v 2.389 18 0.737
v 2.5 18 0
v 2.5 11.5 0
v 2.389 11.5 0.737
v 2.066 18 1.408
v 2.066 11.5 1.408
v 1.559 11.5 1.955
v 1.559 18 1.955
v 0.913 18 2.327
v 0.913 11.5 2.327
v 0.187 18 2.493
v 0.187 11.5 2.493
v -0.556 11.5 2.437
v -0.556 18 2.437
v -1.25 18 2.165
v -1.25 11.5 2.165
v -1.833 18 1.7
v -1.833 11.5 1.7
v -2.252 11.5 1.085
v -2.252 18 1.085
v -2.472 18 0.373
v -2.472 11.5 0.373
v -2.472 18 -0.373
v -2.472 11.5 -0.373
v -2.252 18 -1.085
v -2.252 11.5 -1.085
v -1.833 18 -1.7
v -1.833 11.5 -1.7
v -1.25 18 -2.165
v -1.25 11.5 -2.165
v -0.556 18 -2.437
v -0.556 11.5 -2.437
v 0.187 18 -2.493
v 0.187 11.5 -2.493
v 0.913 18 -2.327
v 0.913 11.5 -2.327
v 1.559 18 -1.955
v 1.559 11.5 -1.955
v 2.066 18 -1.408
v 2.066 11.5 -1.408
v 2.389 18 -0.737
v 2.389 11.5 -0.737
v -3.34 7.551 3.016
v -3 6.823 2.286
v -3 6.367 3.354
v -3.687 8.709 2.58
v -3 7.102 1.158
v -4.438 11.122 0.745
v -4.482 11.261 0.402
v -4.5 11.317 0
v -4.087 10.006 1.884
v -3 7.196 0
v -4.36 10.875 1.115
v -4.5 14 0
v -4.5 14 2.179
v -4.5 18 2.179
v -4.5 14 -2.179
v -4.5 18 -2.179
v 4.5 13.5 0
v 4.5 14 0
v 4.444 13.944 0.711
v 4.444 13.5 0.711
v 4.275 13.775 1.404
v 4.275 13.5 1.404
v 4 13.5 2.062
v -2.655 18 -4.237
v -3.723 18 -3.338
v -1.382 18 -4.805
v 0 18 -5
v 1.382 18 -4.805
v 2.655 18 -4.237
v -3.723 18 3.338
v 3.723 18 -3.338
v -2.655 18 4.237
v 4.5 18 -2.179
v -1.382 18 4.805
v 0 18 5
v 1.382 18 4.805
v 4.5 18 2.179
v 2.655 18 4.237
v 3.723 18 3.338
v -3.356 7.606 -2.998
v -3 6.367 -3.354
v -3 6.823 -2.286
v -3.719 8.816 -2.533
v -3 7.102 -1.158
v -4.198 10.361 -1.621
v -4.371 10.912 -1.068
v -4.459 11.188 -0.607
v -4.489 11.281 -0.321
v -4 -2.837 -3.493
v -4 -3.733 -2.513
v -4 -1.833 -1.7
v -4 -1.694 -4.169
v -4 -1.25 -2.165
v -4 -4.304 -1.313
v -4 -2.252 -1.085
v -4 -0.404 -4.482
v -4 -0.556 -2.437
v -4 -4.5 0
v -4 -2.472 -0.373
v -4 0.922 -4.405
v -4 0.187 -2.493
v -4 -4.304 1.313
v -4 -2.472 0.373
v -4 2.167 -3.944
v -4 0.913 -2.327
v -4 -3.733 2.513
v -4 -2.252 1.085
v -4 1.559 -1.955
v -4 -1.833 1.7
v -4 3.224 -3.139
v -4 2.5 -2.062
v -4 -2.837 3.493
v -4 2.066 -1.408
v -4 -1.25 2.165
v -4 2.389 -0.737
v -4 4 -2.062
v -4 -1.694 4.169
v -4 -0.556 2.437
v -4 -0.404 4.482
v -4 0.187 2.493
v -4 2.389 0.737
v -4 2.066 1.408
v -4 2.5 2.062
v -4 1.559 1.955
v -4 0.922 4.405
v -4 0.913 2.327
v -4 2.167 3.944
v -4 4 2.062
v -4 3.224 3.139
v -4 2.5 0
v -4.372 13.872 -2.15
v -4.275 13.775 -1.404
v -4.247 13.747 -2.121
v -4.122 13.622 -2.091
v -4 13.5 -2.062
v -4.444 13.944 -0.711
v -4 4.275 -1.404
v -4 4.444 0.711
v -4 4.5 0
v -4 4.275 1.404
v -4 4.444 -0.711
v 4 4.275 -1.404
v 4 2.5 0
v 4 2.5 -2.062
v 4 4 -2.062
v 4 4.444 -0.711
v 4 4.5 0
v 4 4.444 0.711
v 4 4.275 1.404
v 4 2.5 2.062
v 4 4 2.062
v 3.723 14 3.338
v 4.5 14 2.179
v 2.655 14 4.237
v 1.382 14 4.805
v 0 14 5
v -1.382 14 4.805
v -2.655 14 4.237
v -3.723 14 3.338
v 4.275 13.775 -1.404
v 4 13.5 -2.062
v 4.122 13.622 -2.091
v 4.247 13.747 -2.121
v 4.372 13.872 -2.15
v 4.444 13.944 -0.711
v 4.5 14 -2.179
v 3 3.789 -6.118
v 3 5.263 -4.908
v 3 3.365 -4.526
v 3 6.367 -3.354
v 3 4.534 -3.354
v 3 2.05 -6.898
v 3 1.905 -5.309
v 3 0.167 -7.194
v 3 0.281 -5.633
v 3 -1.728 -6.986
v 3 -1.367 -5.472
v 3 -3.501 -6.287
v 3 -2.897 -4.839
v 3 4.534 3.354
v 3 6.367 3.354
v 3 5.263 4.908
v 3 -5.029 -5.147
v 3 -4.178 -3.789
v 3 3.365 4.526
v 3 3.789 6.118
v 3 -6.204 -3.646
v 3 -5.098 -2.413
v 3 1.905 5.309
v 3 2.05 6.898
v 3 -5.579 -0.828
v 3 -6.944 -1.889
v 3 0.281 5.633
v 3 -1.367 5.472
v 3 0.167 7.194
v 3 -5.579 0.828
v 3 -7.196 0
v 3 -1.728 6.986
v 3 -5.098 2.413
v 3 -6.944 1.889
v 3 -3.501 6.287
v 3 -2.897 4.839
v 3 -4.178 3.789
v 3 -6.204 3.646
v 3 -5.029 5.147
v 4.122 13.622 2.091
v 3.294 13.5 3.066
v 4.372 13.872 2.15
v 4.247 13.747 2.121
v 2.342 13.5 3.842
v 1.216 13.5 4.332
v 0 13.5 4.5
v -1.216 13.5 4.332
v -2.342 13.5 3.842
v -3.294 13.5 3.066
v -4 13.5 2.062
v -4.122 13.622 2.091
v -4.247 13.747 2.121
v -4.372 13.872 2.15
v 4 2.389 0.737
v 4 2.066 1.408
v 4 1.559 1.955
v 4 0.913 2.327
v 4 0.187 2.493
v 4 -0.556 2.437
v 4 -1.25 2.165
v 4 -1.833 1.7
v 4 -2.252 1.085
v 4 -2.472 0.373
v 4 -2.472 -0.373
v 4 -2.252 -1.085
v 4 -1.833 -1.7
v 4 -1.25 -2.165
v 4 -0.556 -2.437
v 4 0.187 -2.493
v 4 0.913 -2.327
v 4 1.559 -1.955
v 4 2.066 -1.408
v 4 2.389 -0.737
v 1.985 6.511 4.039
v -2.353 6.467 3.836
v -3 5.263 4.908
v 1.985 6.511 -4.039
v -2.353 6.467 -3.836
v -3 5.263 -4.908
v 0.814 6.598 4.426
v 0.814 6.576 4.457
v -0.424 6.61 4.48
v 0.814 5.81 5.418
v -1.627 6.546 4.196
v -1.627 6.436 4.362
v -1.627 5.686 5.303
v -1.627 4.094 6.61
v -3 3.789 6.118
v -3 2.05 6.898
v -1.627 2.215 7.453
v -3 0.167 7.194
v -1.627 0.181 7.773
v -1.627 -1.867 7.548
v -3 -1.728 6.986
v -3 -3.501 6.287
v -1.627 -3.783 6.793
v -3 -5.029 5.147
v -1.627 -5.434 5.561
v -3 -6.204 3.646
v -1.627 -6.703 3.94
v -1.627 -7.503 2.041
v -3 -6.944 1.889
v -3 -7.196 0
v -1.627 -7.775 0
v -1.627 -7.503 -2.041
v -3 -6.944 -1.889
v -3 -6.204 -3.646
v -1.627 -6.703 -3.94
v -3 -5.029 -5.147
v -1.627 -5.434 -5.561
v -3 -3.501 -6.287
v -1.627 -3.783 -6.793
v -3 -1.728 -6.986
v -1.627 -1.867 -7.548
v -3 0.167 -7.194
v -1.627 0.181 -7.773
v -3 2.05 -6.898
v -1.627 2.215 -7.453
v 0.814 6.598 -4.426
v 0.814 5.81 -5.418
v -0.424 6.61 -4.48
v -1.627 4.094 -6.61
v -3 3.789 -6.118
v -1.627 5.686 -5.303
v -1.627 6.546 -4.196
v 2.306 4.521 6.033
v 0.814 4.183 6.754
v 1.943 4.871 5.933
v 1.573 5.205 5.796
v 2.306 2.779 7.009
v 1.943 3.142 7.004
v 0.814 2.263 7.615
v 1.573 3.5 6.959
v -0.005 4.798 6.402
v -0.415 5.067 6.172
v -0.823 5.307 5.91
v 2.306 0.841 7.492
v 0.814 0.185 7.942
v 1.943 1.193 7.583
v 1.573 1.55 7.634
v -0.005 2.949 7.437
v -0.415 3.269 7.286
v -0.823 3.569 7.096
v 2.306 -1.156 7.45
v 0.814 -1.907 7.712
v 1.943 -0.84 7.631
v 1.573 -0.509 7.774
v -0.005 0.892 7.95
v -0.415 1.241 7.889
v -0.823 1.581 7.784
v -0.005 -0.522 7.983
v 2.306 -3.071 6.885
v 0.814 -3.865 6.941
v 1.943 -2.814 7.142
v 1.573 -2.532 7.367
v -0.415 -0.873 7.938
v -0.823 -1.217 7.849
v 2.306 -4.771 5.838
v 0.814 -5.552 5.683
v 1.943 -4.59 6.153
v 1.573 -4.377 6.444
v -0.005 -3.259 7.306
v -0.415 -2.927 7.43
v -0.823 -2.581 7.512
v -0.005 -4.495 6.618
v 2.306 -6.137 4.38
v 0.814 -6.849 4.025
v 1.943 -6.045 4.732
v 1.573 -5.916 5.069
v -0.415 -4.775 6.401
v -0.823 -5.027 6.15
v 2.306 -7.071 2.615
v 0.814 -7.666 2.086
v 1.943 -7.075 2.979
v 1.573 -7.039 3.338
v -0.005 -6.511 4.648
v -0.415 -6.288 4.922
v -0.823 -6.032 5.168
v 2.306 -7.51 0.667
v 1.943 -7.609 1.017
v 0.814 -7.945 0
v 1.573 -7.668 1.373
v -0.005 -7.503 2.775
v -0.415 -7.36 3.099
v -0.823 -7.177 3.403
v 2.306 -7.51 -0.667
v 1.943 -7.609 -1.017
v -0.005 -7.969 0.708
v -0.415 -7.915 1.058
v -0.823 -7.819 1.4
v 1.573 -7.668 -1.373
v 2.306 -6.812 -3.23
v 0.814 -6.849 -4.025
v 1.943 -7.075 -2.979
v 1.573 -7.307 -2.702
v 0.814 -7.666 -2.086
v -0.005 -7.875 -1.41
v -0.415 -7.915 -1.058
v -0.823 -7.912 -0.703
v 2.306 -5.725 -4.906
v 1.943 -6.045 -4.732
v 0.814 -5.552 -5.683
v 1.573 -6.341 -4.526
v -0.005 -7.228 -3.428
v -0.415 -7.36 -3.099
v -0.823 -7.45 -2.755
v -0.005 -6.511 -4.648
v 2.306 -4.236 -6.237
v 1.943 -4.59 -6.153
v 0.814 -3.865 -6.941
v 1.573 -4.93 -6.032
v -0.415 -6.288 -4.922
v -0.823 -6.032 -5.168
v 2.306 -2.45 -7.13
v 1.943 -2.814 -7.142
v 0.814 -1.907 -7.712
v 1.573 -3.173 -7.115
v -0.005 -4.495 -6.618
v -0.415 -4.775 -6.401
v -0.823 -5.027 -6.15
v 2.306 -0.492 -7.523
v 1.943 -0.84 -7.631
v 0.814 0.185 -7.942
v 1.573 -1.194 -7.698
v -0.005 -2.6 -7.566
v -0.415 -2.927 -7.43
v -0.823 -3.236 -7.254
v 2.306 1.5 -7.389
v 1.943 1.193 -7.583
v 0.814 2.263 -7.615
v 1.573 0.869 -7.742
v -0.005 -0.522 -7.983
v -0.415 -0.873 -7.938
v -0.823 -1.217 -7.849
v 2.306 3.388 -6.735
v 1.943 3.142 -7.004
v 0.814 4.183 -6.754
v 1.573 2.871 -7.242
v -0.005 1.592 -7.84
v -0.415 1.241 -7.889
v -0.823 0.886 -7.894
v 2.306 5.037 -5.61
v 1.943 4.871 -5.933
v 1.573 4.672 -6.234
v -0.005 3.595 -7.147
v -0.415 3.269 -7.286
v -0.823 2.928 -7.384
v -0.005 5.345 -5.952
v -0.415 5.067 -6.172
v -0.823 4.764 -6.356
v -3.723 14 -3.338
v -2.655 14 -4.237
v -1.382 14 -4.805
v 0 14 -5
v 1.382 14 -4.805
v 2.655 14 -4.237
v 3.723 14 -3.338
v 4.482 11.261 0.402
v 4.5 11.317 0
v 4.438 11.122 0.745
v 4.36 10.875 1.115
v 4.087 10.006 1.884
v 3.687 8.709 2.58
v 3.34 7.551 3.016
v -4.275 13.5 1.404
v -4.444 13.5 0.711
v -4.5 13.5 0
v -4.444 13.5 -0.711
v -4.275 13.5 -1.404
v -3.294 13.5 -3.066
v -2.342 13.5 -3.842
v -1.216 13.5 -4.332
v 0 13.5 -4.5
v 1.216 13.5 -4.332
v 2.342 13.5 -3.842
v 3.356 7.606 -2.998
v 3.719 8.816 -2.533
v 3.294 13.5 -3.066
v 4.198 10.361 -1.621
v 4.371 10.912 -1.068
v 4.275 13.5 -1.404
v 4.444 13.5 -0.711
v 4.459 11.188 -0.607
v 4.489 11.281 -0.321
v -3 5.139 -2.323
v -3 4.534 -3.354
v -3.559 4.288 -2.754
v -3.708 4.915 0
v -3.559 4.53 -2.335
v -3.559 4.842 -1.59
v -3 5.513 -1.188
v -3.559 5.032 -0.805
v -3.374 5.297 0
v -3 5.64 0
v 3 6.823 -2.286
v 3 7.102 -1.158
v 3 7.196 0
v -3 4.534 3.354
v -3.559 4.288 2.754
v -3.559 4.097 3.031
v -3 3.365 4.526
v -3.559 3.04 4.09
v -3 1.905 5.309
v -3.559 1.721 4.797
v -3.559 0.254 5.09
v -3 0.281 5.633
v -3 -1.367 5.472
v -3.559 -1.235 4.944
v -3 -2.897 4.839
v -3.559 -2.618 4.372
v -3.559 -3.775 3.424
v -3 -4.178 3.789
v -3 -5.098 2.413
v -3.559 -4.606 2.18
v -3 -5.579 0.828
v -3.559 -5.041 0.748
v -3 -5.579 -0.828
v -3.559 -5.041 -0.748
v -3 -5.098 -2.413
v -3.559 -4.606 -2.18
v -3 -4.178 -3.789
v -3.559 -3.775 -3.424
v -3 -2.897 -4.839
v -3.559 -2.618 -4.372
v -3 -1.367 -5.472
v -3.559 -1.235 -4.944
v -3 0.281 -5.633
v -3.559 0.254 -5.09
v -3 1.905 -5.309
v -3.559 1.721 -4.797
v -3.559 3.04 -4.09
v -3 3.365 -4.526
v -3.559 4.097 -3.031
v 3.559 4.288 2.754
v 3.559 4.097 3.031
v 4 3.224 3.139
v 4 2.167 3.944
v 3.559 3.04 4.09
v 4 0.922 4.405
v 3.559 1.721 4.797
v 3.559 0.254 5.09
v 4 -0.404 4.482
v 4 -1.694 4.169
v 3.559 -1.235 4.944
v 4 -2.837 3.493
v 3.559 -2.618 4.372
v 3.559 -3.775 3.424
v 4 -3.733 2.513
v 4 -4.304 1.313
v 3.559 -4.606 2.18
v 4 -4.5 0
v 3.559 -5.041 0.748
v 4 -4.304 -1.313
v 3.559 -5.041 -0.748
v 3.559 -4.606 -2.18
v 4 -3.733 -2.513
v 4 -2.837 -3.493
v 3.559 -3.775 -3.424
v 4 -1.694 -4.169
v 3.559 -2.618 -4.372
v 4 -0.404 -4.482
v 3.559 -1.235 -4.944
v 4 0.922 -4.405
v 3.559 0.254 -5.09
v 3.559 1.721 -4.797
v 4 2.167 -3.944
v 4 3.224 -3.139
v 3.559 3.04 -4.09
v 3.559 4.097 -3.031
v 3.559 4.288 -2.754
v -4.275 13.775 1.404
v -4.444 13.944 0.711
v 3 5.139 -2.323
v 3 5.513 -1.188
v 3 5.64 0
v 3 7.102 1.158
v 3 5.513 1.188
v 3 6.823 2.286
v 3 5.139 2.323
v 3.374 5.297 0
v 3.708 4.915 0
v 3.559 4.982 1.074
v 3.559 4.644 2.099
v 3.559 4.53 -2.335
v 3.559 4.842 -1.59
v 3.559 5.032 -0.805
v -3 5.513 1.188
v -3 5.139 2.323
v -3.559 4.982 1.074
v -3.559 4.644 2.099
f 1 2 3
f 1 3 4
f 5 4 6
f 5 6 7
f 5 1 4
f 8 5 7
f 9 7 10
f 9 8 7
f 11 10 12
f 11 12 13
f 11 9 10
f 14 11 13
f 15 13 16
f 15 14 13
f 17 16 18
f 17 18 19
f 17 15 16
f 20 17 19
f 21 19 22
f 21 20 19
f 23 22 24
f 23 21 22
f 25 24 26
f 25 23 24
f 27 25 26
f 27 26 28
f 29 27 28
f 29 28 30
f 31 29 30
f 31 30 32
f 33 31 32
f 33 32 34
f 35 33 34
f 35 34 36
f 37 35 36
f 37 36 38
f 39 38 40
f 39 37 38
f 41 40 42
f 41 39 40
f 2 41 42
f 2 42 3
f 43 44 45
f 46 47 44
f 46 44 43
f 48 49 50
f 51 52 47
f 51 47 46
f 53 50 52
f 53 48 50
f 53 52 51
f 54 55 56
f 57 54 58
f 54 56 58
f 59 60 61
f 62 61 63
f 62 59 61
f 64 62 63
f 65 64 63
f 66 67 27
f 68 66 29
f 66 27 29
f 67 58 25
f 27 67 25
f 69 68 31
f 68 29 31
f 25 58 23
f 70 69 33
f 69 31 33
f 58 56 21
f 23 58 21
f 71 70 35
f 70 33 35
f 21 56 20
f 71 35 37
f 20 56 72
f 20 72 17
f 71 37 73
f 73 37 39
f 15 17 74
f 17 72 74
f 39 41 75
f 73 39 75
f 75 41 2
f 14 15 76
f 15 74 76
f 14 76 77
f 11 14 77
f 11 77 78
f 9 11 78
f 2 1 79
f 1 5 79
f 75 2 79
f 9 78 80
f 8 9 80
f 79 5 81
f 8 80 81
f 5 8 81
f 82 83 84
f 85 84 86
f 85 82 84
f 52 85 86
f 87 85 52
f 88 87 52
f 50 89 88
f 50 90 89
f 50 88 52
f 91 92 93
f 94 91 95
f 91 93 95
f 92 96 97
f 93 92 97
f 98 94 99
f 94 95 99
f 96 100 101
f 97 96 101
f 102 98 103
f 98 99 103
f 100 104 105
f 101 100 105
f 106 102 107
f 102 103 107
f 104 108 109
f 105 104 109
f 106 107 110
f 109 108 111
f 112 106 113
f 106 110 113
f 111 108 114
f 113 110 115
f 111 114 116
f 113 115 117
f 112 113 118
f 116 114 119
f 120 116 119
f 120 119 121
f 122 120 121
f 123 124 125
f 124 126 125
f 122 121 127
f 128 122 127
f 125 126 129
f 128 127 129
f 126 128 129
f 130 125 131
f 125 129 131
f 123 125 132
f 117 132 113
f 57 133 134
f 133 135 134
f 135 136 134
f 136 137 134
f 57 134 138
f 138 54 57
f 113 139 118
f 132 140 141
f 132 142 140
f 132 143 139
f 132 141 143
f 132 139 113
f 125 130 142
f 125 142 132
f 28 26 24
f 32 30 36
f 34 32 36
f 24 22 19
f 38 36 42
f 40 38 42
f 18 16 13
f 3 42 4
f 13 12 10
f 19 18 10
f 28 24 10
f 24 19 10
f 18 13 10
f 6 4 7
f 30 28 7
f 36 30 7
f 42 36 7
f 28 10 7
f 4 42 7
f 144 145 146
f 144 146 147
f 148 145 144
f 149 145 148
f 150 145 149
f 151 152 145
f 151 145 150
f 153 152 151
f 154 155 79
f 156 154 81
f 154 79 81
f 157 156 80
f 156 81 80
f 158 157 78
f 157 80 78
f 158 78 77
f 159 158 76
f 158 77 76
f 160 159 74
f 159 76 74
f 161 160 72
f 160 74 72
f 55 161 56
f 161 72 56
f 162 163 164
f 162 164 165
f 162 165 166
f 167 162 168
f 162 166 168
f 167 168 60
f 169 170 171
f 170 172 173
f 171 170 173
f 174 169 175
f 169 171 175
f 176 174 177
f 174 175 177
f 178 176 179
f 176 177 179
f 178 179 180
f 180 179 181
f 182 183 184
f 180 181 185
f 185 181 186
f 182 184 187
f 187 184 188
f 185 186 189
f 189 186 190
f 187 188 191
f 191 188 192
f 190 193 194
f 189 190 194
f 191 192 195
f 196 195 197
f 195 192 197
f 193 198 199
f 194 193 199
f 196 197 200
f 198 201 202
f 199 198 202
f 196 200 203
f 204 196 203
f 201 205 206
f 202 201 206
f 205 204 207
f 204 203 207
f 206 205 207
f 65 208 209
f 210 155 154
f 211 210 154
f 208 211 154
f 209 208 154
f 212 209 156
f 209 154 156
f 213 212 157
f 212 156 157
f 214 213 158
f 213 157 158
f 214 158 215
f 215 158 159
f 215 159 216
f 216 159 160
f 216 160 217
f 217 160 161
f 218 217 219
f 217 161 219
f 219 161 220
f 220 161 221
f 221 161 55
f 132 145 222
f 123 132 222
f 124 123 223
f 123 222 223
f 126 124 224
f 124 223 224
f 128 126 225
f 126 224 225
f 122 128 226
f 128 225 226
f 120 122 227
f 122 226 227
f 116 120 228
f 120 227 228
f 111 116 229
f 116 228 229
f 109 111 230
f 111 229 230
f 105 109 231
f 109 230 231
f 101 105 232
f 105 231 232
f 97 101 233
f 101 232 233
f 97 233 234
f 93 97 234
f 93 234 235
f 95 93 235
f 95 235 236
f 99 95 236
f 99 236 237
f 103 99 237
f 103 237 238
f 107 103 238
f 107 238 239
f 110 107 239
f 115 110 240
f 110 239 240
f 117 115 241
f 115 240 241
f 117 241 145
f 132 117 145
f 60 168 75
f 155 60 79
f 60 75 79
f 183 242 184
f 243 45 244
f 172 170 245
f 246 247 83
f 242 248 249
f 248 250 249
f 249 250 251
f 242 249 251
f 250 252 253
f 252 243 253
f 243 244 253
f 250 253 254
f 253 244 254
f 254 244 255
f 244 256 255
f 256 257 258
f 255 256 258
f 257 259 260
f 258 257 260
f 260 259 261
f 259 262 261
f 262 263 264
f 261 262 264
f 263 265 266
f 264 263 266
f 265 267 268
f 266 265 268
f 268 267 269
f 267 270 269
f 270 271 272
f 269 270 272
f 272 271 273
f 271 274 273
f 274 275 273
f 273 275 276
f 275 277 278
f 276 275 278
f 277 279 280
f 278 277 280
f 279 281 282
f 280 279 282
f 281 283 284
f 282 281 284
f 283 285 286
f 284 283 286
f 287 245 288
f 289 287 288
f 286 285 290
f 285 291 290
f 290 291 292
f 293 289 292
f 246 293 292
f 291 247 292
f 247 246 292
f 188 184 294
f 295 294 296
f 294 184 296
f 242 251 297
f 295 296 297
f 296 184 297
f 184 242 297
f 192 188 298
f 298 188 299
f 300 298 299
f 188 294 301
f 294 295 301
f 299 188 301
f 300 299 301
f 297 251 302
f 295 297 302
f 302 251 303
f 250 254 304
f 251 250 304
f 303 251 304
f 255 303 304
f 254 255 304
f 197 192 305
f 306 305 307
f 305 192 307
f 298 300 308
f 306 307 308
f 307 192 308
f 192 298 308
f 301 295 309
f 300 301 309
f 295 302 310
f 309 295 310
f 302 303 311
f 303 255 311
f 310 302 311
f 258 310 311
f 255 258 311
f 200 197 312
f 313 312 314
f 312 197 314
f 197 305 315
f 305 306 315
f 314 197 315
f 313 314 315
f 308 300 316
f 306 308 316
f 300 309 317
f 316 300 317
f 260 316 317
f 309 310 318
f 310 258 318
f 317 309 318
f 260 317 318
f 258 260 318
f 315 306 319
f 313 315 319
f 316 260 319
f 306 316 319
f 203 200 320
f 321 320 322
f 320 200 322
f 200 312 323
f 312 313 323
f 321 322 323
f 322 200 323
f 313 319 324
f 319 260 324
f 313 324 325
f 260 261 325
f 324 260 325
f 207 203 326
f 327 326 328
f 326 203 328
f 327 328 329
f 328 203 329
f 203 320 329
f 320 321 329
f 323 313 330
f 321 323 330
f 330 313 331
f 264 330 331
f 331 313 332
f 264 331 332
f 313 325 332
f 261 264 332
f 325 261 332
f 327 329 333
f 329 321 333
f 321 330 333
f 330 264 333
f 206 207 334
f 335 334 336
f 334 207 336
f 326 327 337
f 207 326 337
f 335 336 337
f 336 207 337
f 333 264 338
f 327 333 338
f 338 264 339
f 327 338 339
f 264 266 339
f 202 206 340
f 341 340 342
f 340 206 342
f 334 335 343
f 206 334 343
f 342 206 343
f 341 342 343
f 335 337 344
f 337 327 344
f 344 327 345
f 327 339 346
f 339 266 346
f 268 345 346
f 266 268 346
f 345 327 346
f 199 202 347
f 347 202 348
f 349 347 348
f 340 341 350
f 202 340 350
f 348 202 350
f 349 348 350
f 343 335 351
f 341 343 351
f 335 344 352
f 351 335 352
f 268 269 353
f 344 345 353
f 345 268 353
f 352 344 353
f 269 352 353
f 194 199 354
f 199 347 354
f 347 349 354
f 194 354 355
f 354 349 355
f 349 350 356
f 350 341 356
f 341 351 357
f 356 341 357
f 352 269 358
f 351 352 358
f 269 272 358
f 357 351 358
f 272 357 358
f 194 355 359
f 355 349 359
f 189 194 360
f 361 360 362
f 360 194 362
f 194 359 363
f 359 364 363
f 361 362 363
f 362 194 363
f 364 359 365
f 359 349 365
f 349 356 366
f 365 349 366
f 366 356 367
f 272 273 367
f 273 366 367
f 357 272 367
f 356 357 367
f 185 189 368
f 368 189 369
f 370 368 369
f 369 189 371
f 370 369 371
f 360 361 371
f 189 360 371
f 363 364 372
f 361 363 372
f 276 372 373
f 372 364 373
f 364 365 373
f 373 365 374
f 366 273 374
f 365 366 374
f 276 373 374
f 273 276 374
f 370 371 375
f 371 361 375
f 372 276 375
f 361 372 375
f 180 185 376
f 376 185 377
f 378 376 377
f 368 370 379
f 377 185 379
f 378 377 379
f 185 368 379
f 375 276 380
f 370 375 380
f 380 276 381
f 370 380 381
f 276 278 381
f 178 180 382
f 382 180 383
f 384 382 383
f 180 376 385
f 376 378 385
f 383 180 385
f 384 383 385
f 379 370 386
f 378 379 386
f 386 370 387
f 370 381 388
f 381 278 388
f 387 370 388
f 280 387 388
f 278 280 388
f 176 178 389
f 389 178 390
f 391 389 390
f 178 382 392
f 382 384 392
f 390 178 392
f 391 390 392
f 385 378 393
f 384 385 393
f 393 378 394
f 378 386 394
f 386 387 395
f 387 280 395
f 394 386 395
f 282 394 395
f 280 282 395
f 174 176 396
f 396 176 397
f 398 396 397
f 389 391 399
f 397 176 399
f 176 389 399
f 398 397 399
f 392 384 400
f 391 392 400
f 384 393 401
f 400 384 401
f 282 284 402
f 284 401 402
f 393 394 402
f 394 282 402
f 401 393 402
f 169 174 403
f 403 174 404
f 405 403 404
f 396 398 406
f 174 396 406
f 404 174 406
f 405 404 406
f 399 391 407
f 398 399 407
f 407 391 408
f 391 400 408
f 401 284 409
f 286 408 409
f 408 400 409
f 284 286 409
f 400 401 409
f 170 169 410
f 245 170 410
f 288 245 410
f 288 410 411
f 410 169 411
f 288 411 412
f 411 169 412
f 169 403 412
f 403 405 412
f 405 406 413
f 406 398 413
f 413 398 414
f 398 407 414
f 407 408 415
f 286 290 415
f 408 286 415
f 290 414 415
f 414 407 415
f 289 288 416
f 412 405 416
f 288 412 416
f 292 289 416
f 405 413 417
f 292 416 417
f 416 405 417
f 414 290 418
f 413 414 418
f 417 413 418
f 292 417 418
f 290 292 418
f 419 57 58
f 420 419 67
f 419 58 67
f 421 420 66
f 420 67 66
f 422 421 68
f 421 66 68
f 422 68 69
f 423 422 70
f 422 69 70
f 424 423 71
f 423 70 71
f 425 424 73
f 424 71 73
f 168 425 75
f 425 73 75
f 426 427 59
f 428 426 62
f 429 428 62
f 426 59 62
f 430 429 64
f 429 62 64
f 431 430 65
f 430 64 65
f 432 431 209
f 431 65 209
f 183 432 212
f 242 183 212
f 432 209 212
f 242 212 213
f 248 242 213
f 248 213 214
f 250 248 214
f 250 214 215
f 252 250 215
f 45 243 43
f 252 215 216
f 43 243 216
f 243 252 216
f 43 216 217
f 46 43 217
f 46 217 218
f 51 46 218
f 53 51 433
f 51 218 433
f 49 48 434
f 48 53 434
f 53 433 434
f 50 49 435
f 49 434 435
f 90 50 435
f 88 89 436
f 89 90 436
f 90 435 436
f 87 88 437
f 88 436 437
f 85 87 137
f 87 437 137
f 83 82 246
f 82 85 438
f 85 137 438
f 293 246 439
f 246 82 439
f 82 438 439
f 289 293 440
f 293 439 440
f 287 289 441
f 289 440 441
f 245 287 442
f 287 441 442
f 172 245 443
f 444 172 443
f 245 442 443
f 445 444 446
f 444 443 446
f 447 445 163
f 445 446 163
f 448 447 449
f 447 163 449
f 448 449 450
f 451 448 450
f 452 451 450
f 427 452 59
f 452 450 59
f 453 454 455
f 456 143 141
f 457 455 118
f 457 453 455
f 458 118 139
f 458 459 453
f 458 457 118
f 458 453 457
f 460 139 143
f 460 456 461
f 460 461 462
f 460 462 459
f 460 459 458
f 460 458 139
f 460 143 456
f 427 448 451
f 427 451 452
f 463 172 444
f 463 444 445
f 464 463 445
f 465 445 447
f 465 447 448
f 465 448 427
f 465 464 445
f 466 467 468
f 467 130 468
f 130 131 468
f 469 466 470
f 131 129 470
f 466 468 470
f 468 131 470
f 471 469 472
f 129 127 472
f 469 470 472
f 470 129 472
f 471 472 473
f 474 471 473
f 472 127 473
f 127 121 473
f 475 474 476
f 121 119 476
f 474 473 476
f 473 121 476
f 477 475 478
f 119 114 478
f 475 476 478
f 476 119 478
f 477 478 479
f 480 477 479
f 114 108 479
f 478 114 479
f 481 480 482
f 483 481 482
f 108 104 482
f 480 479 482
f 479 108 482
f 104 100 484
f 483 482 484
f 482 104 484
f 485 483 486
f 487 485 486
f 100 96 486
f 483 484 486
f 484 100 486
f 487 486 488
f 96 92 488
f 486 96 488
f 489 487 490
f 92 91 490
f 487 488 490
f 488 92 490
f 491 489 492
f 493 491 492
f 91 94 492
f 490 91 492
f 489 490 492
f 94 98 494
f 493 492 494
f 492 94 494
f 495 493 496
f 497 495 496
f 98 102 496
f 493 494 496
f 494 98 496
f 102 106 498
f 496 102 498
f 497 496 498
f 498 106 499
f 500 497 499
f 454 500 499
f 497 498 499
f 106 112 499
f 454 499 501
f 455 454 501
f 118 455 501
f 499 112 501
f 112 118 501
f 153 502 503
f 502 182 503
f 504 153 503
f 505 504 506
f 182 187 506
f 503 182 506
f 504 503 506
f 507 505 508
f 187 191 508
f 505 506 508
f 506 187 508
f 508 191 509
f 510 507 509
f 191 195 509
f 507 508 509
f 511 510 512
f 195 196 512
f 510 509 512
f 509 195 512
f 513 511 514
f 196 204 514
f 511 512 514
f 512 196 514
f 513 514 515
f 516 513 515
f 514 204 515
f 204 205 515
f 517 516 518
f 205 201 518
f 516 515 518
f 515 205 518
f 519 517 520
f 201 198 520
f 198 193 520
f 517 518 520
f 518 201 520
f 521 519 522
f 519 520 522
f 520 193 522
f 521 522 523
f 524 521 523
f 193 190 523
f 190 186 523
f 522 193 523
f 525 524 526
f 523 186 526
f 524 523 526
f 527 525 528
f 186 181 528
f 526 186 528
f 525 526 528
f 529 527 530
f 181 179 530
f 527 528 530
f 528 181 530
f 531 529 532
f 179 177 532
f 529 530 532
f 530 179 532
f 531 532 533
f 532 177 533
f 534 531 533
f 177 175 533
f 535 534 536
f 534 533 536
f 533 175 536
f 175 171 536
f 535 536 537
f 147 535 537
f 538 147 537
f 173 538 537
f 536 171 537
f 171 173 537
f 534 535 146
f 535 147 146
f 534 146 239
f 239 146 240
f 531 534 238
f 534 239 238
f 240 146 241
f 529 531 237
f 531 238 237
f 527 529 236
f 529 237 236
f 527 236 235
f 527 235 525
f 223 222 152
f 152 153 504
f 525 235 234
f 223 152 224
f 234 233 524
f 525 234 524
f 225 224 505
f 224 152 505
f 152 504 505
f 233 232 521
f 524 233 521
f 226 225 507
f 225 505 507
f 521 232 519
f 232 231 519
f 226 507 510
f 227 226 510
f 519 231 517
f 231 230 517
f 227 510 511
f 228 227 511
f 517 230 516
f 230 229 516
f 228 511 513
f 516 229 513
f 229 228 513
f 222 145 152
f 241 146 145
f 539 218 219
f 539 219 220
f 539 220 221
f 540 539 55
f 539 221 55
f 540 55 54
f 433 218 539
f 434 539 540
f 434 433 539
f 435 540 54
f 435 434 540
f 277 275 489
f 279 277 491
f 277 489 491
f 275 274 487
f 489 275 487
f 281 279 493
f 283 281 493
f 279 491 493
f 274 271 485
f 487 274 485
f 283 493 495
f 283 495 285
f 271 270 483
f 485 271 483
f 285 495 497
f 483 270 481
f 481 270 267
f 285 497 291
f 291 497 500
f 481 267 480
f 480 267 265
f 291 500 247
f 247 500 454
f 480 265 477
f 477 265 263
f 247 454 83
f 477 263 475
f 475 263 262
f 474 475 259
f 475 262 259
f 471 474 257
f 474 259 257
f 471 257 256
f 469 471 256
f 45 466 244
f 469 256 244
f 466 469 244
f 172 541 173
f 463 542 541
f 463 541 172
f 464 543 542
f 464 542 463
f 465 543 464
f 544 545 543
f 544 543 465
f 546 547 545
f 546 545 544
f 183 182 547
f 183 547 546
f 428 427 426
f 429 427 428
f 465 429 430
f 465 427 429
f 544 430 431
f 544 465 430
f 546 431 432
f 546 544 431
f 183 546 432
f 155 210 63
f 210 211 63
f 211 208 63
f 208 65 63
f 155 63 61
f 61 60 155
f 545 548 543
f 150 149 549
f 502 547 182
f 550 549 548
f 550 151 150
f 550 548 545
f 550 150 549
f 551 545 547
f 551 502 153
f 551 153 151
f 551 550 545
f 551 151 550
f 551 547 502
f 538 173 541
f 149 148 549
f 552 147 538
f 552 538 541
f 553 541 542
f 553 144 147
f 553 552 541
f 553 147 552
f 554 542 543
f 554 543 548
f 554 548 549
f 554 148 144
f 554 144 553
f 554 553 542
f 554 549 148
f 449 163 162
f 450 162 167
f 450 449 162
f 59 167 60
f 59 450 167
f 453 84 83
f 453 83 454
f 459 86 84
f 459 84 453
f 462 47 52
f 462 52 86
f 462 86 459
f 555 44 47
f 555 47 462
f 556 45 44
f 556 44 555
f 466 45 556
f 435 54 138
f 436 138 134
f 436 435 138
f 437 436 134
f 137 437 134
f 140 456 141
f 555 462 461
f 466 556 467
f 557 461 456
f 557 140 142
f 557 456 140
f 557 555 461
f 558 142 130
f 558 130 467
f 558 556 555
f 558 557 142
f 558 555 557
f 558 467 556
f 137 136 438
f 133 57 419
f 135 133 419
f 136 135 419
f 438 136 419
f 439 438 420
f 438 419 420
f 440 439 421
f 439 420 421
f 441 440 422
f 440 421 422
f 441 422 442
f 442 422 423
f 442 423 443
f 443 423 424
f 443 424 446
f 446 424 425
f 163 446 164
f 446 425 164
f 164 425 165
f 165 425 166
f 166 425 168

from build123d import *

# Parameters (mm, degrees)
F9_R          = 2.5
F10_DEPTH     = 15.5
F11_DEPTH     = 4.5
F12_DEPTH     = 6.5
F13_T2_ANGLE  = 157.8095212227
F13_T6_DEPTH  = 3.4652909658
F13_S7_R      = 4.5
F13_T8_DEPTH  = 3
F13_T12_DEPTH = 3.4652909658
F13_S13_R     = 4.5
F13_T14_DEPTH = 3
F13_T16_ANGLE = 157.8095212227
F13_T20_DEPTH = 3.4652909658
F13_S21_R     = 4.5
F13_T22_DEPTH = 3
F13_T26_DEPTH = 3.4652909658
F13_S27_R     = 4.5
F13_T28_DEPTH = 3


# Not quite as in the source:
# - a fillet or chamfer that OpenCascade refuses, or shapes differently, is made with other operations: its cross-section is extruded or revolved along the edge and cut away or added


with BuildPart() as f7:
    # F6 (on Top) → F7 (revolve)
    with BuildSketch(Plane.XY):
        with BuildLine():
            Line((-4, 4.5), (-4, 2.5))
            Line((-4, 2.5), (4, 2.5))
            Line((4, 2.5), (4, 4.5))
            ThreePointArc((4, 4.5), (3.5461149614, 5.1104772433), (3, 5.6400549446))
            ThreePointArc((3, 5.6400549446), (0, 6.716990566), (-3, 5.6400549446))
            ThreePointArc((-3, 5.6400549446), (-3.5461149614, 5.1104772433), (-4, 4.5))
        make_face()
        with BuildLine():
            Line((-3, 7.1961524227), (-3, 5.6400549446))
            ThreePointArc((-3, 5.6400549446), (0, 6.716990566), (3, 5.6400549446))
            Line((3, 5.6400549446), (3, 7.1961524227))
            ThreePointArc((3, 7.1961524227), (0, 8), (-3, 7.1961524227))
        make_face()
    revolve(axis=Axis((0, 0, 0), (1, 0, 0)))

    # F9 (on offset) → F10 (join)
    with BuildSketch(Plane.XZ.offset(-18)):
        with BuildLine():
            ThreePointArc((-4.5, 0), (0, -4.5), (4.5, 0))
            ThreePointArc((4.5, 0), (0, 4.5), (-4.5, 0))
        make_face()
        Circle(F9_R, mode=Mode.SUBTRACT)
        Circle(F9_R)
    extrude(amount=F10_DEPTH)

    # F9 (on offset) → F11 (join)
    with BuildSketch(Plane.XZ.offset(-18)):
        with BuildLine():
            ThreePointArc((-4.5, 0), (0, 4.5), (4.5, 0))
            Line((4.5, 0), (4.5, 2.1794494718))
            ThreePointArc((4.5, 2.1794494718), (0, 5), (-4.5, 2.1794494718))
            Line((-4.5, 2.1794494718), (-4.5, 0))
        make_face()
        with BuildLine():
            Line((4.5, -2.1794494718), (4.5, 0))
            ThreePointArc((4.5, 0), (0, -4.5), (-4.5, 0))
            Line((-4.5, 0), (-4.5, -2.1794494718))
            ThreePointArc((-4.5, -2.1794494718), (0, -5), (4.5, -2.1794494718))
        make_face()
    extrude(amount=F11_DEPTH)

    # F9 (on offset) → F12 (cut)
    with BuildSketch(Plane.XZ.offset(-18)):
        Circle(F9_R)
    extrude(amount=F12_DEPTH, mode=Mode.SUBTRACT)

    # F13: chamfer of 0.5 on 6 edges, made by hand

    # F13_s1 → F13_t2 (revolve, cut)
    with BuildSketch(Plane(origin=(0, 0, 0), x_dir=(0, 1, 0), z_dir=(0.1924404319, 0, -0.9813086569))):
        Polygon((13.5, 4.5), (14, 5), (13.5, 5), align=None)
    revolve(axis=Axis((0, 13.5, 0), (0, -1, 0)), revolution_arc=F13_T2_ANGLE, mode=Mode.SUBTRACT)


with BuildPart() as f13_tool4:
    # F13_s5 → F13_t6 (new body)
    with BuildSketch(Plane.XY):
        Polygon((4, 13.5), (4.5, 14), (4.5, 13.5), align=None)
    extrude(amount=F13_T6_DEPTH)

    # F13_s7 → F13_t8 (cut, symmetric)
    with BuildSketch(Plane.XZ.offset(-13.8)):
        Circle(F13_S7_R)
    extrude(amount=F13_T8_DEPTH, both=True, mode=Mode.SUBTRACT)


with BuildPart() as f7_1:
    add(f7.part)

    # F13_t3: cut F13_tool4
    add(f13_tool4.part, mode=Mode.SUBTRACT)


with BuildPart() as f13_tool10:
    # F13_s11 → F13_t12 (new body)
    with BuildSketch(Plane.XY.offset(3.4652909658)):
        Polygon((-4, 13.5), (-4.5, 14), (-4.5, 13.5), align=None)
    extrude(amount=-F13_T12_DEPTH)

    # F13_s13 → F13_t14 (cut, symmetric)
    with BuildSketch(Plane.XZ.offset(-13.8)):
        Circle(F13_S13_R)
    extrude(amount=F13_T14_DEPTH, both=True, mode=Mode.SUBTRACT)


with BuildPart() as f7_2:
    add(f7_1.part)

    # F13_t9: cut F13_tool10
    add(f13_tool10.part, mode=Mode.SUBTRACT)

    # F13_s15 → F13_t16 (revolve, cut)
    with BuildSketch(Plane(origin=(0, 0, 0), x_dir=(0, 1, 0), z_dir=(-0.1924404319, 0, 0.9813086569))):
        Polygon((13.5, 4.5), (14, 5), (13.5, 5), align=None)
    revolve(axis=Axis((0, 13.5, 0), (0, -1, 0)), revolution_arc=F13_T16_ANGLE, mode=Mode.SUBTRACT)


with BuildPart() as f13_tool18:
    # F13_s19 → F13_t20 (new body)
    with BuildSketch(Plane.XY.offset(-3.4652909658)):
        Polygon((4, 13.5), (4.5, 14), (4.5, 13.5), align=None)
    extrude(amount=F13_T20_DEPTH)

    # F13_s21 → F13_t22 (cut, symmetric)
    with BuildSketch(Plane.XZ.offset(-13.8)):
        Circle(F13_S21_R)
    extrude(amount=F13_T22_DEPTH, both=True, mode=Mode.SUBTRACT)


with BuildPart() as f7_3:
    add(f7_2.part)

    # F13_t17: cut F13_tool18
    add(f13_tool18.part, mode=Mode.SUBTRACT)


with BuildPart() as f13_tool24:
    # F13_s25 → F13_t26 (new body)
    with BuildSketch(Plane.XY):
        Polygon((-4, 13.5), (-4.5, 14), (-4.5, 13.5), align=None)
    extrude(amount=-F13_T26_DEPTH)

    # F13_s27 → F13_t28 (cut, symmetric)
    with BuildSketch(Plane.XZ.offset(-13.8)):
        Circle(F13_S27_R)
    extrude(amount=F13_T28_DEPTH, both=True, mode=Mode.SUBTRACT)


with BuildPart() as f7_4:
    add(f7_3.part)

    # F13_t23: cut F13_tool24
    add(f13_tool24.part, mode=Mode.SUBTRACT)

    # F6 (on Top) → F14 (revolve, cut)
    with BuildSketch(Plane.XY):
        with BuildLine():
            Line((4, 4.5), (4, 2.5))
            Line((4, 2.5), (6, 2.5))
            Line((6, 2.5), (6, 11.5))
            Line((6, 11.5), (4.566472411, 11.5))
            Line((4.566472411, 11.5), (3, 7.1961524227))
            Line((3, 7.1961524227), (3, 5.6400549446))
            ThreePointArc((3, 5.6400549446), (3.5461149614, 5.1104772433), (4, 4.5))
        make_face()
        with BuildLine():
            Line((-6, 2.5), (-4, 2.5))
            Line((-4, 2.5), (-4, 4.5))
            ThreePointArc((-4, 4.5), (-3.5461149614, 5.1104772433), (-3, 5.6400549446))
            Line((-3, 5.6400549446), (-3, 7.1961524227))
            Line((-3, 7.1961524227), (-4.566472411, 11.5))
            Line((-4.566472411, 11.5), (-6, 11.5))
            Line((-6, 11.5), (-6, 2.5))
        make_face()
    revolve(axis=Axis((0, 0, 0), (1, 0, 0)), mode=Mode.SUBTRACT)


solid = f7_4.part
